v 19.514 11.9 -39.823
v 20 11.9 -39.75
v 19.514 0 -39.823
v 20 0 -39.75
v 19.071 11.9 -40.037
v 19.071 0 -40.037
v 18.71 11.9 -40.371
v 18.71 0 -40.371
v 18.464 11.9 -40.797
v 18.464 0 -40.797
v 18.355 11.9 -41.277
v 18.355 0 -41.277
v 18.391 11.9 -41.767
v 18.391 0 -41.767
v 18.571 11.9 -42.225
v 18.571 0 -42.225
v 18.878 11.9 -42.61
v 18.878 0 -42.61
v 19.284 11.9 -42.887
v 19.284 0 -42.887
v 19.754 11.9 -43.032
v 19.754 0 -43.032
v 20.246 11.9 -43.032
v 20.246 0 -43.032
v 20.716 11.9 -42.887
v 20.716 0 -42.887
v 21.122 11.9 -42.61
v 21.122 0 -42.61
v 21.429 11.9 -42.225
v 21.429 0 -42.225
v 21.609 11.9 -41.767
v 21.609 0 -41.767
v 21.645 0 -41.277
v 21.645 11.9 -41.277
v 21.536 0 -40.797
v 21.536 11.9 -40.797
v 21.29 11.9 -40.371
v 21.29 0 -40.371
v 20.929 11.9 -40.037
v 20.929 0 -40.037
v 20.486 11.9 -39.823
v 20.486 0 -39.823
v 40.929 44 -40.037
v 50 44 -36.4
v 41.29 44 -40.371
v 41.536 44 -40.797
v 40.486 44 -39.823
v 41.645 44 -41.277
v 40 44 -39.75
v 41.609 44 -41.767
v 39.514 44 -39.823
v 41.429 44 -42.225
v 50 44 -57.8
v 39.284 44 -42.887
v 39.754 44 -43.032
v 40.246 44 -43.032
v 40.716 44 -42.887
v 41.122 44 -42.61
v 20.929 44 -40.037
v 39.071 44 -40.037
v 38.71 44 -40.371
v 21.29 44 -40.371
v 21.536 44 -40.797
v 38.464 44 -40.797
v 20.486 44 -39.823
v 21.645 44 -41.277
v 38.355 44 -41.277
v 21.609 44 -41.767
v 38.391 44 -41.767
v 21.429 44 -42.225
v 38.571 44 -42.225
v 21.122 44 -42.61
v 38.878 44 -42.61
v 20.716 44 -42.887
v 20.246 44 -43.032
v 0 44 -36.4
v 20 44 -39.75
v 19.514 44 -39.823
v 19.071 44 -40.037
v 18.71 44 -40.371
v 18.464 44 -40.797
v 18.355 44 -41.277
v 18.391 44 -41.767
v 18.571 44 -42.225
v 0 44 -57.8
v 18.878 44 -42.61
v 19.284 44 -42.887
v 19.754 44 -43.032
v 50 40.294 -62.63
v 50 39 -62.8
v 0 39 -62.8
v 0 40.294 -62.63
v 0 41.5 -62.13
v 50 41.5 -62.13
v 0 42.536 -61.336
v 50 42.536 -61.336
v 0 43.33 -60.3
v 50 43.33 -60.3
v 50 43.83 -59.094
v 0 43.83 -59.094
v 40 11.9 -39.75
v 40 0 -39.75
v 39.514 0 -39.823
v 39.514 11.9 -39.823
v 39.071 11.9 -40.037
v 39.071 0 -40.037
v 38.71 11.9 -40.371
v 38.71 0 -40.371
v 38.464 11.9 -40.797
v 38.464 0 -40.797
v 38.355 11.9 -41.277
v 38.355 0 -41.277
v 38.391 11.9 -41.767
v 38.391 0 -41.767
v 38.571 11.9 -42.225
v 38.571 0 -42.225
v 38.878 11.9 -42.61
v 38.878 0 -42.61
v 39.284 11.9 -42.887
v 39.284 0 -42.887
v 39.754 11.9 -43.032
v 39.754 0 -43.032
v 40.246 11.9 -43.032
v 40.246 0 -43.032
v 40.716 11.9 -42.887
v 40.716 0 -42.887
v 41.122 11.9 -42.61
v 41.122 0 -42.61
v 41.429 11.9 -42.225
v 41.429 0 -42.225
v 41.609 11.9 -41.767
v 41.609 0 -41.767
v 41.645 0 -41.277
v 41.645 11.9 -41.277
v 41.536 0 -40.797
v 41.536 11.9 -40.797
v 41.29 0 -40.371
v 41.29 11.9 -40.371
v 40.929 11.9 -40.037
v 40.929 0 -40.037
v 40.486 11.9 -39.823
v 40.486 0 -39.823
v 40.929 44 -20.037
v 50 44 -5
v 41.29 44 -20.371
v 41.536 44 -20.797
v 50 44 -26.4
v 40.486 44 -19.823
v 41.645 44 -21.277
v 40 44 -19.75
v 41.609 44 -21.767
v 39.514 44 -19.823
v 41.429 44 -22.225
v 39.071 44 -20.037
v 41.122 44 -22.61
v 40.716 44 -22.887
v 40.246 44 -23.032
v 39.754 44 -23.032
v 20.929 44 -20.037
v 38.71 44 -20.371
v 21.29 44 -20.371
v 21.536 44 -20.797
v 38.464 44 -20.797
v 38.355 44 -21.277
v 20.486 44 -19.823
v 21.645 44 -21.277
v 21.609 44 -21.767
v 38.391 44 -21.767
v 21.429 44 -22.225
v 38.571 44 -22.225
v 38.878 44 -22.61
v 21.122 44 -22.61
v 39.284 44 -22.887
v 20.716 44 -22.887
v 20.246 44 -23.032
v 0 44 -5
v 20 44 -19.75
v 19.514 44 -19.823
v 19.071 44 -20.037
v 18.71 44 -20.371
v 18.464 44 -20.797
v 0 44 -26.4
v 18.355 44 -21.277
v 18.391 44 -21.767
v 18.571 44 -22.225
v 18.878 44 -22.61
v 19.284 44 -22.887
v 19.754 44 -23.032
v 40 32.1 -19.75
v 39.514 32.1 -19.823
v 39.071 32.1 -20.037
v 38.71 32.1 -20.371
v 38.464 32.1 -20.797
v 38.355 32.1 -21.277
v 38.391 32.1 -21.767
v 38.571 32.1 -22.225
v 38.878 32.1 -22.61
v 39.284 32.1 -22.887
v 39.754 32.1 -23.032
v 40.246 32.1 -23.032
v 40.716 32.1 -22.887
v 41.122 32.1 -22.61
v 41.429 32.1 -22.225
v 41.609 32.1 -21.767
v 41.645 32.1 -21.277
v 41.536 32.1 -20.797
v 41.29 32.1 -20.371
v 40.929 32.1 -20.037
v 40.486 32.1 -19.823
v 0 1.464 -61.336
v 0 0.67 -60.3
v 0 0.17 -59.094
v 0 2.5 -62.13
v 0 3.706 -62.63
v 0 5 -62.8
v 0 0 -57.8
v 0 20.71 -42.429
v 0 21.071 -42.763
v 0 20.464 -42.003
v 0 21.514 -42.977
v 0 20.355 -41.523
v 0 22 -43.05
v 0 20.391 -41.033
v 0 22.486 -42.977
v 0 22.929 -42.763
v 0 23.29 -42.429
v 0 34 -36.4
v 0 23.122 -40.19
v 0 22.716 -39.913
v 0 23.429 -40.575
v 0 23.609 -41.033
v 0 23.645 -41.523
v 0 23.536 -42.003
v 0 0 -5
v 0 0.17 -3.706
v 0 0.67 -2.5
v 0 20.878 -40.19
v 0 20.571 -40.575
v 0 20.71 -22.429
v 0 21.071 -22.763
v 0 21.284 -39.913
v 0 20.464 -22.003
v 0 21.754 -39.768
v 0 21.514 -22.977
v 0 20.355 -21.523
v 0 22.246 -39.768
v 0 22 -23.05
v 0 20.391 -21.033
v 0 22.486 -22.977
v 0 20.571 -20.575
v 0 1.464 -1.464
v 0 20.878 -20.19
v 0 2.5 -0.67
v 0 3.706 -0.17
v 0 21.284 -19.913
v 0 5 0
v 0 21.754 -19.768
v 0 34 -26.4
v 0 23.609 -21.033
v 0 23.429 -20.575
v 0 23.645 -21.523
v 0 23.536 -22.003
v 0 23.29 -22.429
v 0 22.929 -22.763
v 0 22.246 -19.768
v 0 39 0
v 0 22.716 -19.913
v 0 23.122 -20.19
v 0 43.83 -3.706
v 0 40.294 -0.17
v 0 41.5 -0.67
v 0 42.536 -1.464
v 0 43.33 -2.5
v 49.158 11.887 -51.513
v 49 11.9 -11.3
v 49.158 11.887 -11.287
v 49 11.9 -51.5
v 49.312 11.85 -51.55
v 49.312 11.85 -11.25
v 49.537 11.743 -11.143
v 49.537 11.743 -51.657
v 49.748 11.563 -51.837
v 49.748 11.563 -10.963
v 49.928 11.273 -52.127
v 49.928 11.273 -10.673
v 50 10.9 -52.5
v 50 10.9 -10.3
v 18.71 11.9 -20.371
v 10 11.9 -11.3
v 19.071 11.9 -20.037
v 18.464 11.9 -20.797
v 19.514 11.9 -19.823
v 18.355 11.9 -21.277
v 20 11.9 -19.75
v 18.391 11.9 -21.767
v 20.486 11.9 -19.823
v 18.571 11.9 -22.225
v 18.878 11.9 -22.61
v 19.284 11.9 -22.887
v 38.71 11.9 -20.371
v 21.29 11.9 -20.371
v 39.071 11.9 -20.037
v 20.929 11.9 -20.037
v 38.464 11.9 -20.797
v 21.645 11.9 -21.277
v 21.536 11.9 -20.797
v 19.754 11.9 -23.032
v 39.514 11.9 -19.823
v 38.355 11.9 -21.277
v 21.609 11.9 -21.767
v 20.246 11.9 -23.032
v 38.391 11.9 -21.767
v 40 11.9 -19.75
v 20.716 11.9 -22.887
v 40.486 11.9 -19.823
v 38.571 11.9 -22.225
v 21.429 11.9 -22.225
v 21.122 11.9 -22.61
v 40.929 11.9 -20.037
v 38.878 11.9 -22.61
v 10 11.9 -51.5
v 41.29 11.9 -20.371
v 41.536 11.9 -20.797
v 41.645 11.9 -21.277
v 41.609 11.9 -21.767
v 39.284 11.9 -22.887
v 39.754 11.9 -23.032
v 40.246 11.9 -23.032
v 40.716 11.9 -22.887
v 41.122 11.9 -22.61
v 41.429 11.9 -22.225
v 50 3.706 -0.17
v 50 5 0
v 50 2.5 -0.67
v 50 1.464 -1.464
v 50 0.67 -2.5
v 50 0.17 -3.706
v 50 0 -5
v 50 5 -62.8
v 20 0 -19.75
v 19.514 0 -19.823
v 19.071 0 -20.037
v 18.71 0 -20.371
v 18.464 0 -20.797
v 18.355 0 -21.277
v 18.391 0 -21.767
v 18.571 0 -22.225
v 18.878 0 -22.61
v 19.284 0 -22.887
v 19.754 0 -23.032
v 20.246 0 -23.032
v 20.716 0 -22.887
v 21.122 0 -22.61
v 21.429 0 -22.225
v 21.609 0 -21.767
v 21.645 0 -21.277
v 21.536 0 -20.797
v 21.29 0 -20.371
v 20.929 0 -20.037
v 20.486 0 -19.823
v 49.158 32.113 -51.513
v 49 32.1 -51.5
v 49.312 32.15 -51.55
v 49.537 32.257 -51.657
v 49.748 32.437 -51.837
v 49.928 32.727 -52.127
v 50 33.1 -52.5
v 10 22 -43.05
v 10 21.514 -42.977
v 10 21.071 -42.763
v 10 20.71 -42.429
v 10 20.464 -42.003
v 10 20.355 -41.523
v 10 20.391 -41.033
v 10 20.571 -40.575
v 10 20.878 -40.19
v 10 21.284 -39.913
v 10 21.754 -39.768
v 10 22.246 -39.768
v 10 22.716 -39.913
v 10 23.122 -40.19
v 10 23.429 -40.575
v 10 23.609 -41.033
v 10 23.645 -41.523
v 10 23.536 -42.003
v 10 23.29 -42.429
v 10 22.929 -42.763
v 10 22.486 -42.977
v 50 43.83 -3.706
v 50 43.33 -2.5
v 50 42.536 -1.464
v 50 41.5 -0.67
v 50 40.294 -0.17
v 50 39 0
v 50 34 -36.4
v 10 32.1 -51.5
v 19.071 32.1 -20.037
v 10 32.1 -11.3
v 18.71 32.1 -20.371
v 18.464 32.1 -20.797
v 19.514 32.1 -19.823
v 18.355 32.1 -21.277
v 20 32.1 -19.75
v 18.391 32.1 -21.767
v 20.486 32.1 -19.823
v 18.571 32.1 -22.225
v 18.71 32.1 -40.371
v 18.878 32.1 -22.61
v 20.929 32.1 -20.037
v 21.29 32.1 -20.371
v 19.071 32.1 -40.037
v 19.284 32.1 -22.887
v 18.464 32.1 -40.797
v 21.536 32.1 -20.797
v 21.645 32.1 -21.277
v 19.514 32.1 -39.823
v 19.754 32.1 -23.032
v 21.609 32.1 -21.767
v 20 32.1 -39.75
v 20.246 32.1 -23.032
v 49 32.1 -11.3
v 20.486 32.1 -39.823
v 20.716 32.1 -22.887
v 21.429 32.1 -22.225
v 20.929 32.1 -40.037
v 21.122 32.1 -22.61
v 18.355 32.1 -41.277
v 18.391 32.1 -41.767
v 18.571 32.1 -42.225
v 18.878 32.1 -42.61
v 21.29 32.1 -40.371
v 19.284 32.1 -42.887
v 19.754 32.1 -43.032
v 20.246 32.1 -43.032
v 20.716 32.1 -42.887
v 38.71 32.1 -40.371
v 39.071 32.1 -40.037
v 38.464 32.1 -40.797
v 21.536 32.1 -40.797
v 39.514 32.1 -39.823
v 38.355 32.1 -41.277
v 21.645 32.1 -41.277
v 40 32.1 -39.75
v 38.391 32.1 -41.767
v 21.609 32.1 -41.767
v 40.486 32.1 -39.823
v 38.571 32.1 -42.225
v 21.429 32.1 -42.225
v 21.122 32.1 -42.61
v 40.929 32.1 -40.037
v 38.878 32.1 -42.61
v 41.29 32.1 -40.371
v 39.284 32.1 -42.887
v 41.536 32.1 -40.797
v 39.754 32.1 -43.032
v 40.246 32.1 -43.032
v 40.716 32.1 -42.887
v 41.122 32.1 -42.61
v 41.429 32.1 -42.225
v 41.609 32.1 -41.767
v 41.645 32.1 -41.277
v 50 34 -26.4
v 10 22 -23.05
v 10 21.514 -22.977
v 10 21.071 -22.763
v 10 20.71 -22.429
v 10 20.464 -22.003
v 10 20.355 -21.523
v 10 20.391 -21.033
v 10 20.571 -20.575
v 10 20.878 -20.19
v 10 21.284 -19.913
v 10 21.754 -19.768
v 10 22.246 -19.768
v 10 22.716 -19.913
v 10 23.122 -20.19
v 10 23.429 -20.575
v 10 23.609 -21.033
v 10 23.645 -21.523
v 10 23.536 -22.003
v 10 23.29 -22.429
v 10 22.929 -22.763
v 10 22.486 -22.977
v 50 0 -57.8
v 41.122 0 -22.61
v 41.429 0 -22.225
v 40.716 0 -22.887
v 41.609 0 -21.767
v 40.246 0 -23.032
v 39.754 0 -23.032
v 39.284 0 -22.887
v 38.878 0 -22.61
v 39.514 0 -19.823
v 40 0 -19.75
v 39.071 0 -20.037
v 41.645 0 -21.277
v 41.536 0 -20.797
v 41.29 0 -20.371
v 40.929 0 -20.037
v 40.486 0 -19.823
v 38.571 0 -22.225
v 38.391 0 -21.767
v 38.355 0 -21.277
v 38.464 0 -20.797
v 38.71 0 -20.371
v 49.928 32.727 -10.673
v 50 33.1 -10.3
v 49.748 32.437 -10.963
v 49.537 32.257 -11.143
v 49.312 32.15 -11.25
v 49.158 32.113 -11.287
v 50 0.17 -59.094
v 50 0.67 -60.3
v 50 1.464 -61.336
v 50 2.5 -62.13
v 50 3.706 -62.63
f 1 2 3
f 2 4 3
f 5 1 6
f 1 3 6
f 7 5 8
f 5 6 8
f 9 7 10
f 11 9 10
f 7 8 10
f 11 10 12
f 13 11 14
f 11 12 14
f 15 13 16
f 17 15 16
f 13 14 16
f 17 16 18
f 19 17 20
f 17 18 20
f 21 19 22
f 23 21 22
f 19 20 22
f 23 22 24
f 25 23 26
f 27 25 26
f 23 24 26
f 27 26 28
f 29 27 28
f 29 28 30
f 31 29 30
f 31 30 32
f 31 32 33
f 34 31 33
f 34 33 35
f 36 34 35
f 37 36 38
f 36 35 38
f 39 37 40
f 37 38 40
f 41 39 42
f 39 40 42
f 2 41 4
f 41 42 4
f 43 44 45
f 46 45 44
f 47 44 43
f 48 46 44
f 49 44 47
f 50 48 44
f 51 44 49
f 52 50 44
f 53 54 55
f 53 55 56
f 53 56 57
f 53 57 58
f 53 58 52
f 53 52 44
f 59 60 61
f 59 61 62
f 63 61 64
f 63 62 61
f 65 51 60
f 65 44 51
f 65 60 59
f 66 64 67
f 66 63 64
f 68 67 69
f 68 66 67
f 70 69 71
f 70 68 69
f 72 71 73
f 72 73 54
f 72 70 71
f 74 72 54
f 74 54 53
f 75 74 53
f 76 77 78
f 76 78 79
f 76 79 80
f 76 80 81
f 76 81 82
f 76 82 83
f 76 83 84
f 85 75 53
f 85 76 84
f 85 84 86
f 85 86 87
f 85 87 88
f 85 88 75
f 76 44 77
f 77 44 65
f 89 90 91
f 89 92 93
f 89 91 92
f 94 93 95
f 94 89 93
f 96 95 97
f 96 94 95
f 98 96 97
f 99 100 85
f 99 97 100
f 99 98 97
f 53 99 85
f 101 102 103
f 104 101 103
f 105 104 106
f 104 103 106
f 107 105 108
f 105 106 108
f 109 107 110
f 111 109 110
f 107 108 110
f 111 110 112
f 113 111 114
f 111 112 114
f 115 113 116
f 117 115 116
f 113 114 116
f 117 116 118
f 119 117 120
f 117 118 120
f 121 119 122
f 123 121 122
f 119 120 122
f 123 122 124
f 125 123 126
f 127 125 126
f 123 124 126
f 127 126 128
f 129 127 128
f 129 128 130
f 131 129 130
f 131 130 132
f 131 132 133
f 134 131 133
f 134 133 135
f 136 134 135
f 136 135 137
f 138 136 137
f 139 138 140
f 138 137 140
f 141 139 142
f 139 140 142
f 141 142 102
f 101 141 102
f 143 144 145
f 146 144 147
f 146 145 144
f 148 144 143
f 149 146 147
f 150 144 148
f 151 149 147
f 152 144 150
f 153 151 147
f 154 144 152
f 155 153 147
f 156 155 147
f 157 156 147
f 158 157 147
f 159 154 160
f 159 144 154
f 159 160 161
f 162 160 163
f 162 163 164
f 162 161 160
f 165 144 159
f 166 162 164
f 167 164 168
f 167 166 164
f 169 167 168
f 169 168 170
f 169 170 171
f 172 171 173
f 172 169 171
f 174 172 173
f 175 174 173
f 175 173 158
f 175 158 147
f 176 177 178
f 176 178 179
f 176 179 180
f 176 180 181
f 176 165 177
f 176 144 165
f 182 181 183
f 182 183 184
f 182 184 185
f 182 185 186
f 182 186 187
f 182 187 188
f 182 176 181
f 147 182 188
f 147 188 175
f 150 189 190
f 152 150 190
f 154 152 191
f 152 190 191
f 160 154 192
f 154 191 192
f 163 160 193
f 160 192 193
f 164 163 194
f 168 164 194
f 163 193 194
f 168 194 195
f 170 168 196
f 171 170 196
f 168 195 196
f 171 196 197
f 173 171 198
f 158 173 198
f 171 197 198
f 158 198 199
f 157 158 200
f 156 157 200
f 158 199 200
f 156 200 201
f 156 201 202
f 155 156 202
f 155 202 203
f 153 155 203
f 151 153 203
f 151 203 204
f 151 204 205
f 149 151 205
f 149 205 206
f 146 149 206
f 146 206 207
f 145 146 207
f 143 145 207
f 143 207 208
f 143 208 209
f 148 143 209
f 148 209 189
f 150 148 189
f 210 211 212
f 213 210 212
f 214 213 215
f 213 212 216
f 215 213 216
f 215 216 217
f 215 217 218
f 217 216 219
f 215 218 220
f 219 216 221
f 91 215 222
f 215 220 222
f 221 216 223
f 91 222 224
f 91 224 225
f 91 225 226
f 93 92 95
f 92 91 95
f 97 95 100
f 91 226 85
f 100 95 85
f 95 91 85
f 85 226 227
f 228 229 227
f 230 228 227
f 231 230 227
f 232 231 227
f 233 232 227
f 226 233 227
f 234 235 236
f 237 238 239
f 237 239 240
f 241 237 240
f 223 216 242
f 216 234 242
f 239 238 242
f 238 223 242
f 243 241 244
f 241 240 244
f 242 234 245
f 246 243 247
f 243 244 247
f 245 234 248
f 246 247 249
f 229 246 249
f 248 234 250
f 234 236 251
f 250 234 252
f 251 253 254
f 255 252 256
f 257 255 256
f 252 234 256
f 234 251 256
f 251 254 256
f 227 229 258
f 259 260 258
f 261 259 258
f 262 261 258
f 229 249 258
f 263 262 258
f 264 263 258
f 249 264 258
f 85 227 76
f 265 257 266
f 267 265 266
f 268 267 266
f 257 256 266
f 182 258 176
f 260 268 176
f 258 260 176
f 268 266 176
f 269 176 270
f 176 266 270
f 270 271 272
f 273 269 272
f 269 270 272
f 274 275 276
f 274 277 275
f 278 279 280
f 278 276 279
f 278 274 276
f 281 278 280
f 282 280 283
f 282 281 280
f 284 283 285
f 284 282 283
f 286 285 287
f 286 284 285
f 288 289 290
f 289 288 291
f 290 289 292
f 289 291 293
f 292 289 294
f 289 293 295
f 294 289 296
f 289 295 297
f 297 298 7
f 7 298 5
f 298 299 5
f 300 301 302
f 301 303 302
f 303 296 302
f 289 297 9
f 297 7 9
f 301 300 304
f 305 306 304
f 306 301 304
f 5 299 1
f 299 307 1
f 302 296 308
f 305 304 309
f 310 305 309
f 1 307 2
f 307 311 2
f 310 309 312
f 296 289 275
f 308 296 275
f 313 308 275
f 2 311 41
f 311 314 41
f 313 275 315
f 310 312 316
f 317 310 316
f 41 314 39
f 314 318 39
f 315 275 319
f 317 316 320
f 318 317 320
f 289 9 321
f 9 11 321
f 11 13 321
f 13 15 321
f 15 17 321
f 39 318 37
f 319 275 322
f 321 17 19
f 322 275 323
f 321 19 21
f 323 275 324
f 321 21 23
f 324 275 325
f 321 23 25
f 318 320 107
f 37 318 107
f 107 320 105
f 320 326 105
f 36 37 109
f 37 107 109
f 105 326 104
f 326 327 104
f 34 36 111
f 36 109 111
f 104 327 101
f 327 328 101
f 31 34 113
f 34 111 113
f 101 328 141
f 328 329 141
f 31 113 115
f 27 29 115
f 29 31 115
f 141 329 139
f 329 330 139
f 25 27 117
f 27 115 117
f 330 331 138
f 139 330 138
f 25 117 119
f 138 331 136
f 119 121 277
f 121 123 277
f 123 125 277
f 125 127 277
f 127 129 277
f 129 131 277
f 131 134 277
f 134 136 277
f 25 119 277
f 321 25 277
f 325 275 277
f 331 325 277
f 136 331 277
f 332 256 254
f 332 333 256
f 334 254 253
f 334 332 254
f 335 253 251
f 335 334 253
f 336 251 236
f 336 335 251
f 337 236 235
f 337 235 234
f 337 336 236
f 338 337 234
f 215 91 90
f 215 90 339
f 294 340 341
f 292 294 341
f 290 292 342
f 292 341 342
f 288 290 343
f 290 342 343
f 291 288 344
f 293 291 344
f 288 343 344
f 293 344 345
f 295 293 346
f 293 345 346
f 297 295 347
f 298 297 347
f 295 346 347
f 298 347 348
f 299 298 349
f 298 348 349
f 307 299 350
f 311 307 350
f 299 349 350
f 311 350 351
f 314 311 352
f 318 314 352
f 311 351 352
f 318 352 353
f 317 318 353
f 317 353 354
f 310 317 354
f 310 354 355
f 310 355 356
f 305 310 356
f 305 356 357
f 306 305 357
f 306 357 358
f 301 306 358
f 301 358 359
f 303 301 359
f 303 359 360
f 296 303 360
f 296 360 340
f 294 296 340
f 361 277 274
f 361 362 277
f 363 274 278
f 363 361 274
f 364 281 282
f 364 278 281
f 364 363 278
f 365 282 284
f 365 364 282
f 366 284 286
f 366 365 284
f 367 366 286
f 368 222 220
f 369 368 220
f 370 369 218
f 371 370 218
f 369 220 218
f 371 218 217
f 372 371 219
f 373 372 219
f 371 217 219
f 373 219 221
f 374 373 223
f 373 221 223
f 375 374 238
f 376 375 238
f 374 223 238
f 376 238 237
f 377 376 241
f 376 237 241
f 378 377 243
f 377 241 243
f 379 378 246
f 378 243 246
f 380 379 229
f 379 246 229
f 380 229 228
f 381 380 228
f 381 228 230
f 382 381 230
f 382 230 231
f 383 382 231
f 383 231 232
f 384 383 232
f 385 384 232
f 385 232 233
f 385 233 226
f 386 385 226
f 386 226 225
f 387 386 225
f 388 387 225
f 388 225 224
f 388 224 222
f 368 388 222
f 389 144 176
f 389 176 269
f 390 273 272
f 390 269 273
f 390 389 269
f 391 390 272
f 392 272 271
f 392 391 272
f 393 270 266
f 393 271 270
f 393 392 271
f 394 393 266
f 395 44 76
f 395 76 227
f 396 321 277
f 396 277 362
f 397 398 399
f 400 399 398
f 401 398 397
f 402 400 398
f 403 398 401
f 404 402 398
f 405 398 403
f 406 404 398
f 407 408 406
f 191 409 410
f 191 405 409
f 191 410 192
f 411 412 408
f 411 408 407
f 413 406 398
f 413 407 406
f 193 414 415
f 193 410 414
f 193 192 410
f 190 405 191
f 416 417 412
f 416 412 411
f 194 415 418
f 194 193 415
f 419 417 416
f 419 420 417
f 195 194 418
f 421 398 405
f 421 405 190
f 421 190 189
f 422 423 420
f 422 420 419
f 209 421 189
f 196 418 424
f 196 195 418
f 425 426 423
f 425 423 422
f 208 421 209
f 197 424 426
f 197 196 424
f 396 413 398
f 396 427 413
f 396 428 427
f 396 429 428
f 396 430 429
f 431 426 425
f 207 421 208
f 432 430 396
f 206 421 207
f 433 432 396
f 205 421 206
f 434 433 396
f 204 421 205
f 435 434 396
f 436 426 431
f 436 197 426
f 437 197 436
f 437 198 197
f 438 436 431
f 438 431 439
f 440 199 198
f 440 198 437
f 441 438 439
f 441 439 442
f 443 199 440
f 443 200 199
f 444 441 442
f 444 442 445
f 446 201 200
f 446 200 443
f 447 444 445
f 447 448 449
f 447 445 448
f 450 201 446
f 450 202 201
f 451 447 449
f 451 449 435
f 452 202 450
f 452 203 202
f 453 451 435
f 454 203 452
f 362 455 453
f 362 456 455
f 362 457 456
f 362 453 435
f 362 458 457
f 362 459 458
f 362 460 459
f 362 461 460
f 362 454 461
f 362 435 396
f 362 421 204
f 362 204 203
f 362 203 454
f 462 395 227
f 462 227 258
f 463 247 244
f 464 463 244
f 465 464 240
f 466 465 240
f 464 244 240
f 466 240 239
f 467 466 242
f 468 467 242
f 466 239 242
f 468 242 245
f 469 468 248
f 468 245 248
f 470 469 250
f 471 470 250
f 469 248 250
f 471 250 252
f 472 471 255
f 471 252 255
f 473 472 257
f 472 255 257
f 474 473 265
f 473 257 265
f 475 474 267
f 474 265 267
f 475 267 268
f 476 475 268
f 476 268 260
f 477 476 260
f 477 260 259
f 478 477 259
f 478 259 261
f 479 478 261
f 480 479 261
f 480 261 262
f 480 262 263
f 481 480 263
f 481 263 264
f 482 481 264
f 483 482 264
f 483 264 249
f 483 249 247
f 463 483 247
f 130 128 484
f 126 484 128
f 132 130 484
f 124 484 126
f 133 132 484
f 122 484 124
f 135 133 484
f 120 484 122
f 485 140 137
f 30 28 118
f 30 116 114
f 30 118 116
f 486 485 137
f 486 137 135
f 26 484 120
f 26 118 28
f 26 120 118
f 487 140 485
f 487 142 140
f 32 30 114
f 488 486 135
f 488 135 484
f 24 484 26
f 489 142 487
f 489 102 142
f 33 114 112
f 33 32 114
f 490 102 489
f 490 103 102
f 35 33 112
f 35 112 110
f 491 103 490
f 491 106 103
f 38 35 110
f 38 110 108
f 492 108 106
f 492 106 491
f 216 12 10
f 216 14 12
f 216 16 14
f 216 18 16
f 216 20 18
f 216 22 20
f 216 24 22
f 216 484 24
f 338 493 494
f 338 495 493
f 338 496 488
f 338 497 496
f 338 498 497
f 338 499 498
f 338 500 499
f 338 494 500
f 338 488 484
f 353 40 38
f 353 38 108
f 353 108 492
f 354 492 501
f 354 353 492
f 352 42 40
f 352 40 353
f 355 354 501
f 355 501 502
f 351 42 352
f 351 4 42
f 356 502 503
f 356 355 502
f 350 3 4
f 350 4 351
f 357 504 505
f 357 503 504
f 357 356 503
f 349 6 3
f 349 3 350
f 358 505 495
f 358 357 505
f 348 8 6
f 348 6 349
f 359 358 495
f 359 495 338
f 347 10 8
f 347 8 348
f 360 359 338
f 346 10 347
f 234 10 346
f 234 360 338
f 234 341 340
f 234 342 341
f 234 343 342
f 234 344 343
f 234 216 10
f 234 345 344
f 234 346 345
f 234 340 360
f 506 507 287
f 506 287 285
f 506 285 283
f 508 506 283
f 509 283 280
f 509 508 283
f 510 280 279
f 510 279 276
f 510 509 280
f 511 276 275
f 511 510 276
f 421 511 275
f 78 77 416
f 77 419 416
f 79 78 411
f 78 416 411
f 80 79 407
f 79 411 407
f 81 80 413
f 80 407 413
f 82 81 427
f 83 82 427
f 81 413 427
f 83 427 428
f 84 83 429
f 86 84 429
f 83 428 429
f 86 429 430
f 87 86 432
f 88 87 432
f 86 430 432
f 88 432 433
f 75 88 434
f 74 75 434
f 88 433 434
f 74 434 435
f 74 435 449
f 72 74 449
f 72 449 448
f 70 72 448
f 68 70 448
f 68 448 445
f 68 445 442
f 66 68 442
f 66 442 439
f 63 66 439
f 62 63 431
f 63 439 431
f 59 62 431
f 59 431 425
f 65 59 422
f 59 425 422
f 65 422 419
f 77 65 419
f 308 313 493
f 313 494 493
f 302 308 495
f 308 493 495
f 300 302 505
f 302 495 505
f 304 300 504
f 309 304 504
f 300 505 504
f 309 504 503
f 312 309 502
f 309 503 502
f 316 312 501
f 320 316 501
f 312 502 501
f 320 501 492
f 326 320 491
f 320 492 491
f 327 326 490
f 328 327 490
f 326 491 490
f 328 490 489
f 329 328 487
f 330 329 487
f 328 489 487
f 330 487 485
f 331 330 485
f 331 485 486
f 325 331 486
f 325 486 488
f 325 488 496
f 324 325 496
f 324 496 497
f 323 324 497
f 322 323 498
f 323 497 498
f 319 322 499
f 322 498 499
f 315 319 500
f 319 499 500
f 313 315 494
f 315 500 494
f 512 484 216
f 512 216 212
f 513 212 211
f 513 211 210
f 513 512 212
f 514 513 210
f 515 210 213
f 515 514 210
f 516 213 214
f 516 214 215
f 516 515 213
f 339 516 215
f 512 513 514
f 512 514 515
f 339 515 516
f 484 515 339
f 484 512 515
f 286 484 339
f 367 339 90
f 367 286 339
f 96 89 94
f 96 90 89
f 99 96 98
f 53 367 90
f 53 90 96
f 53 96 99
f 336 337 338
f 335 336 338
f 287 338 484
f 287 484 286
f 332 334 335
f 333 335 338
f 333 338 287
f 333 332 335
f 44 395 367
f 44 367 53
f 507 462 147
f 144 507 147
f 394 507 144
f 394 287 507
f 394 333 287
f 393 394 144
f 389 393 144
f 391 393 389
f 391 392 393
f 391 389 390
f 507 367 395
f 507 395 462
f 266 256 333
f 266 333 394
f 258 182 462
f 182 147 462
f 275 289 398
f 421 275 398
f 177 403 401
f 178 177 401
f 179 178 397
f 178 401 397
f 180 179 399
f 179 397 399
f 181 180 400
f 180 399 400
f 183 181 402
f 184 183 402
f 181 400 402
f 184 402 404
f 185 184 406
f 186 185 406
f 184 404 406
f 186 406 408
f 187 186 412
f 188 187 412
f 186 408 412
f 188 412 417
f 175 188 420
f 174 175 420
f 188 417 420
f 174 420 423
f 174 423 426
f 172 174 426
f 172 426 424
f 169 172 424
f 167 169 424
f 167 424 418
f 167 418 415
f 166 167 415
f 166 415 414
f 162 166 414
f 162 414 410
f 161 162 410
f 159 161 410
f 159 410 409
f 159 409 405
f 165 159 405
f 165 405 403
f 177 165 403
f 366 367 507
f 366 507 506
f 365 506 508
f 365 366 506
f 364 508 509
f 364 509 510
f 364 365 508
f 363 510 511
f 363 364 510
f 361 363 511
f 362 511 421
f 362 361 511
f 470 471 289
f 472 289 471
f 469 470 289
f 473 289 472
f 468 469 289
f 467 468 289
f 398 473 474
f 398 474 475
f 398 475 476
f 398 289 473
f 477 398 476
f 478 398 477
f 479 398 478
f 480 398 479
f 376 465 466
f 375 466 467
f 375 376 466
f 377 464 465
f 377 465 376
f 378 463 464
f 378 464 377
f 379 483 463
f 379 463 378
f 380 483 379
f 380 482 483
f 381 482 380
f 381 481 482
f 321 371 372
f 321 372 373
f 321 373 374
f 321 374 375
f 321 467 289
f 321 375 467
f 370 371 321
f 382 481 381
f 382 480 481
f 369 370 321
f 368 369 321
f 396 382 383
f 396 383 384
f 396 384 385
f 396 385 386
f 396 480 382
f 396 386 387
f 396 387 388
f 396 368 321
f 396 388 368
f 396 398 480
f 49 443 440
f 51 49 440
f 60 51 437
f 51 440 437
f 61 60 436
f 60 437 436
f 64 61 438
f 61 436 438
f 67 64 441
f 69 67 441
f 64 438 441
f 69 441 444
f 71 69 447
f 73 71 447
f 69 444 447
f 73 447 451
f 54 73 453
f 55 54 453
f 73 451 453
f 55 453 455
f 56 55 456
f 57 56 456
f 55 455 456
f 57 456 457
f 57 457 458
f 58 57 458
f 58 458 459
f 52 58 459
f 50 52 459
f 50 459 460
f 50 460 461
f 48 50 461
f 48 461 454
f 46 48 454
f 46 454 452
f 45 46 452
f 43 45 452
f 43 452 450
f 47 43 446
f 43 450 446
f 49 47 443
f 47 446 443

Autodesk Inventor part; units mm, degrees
ref_plane "YZ Plane" through (0, 0, 0) normal (1, 0, 0) x (0, 1, 0)
ref_plane "XZ Plane" through (0, 0, 0) normal (0, 1, 0) x (-1, 0, 0)
ref_plane "XY Plane" through (0, 0, 0) normal (0, 0, 1) x (1, 0, 0)
sketch "スケッチ1" plane through (0, 0, 0) normal (1, 0, 0) x (0, 1, 0)
  line L0 (0, 0) -> (44, 0)
  line L1 (44, 0) -> (44, -62.8)
  line L2 (44, -62.8) -> (0, -62.8)
  line L3 (0, -62.8) -> (0, 0)
  dimension "d0" = 44
  dimension "d1" = 62.8
extrude "押し出し1" add sketch "スケッチ1" along normal blind 50
sketch "スケッチ2" plane through (50, 0, 0) normal (1, 0, 0) x (0, 0, -1)
  line L0 (0, 44) -> (0, 0) projected
  line L1 (0, 22) -> (62.8, 22)
  line L2 (62.8, 0) -> (62.8, 44) projected
  line L3 (62.8, 44) -> (0, 44) projected
  line L4 (31.4, 44) -> (31.4, 0)
  line L5 (0, 0) -> (62.8, 0) projected
  line L6 (31.4, 22) -> (51.5, 22)
  line L7 (51.5, 22) -> (51.5, 32.1)
  line L8 (51.5, 32.1) -> (31.4, 32.1)
  line L9 (31.4, 32.1) -> (31.4, 22)
  line L10 (11.3, 22) -> (11.3, 32.1)
  line L11 (11.3, 32.1) -> (31.4, 32.1)
  line L12 (51.5, 22) -> (51.5, 11.9)
  line L13 (51.5, 11.9) -> (31.4, 11.9)
  line L14 (11.3, 11.9) -> (31.4, 11.9)
  line L15 (11.3, 22) -> (11.3, 11.9)
  dimension "d4" = 20.1
  dimension "d5" = 10.1
extrude "押し出し2" cut sketch "スケッチ2" against normal blind 40 contours L10 L11 L4 L1 | L1 L4 L14 L15 | L8 L7 L1 L4 | L1 L12 L13 L4
sketch "スケッチ3" plane through (0, 44, 0) normal (0, 1, 0) x (1, 0, 0)
  line L0 (0, 0) -> (50, 0) projected
  line L1 (10, 0) -> (10, 62.8)
  line L2 (0, 62.8) -> (50, 62.8) projected
  line L3 (0, 62.8) -> (0, 0) projected
  line L4 (0, 31.4) -> (50, 31.4)
  line L5 (50, 0) -> (50, 62.8) projected
  line L6 (10, 41.4) -> (50, 41.4)
  point P0 (20, 41.4)
  point P1 (40, 41.4)
  point P2 (20, 21.4)
  point P3 (40, 21.4)
  dimension "d8" = 10
  dimension "d9" = 10
  dimension "d10" = 10
  dimension "d11" = 20
hole "穴1" at (20, 44, -41.4) at (40, 44, -41.4) at (20, 44, -21.4) at (40, 44, -21.4) direction (0, -1, 0) diameter 3.3 end through all
fillet "フィレット1" radius 5 4 edges at (25, 44, 0) (25, 0, 0) (25, 0, -62.8) (25, 44, -62.8)
sketch "スケッチ4" plane through (10, 0, 0) normal (1, 0, 0) x (0, 0, -1)
  line L0 (11.3, 11.9) -> (11.3, 32.1) projected
  line L1 (11.3, 22) -> (51.5, 22)
  line L2 (51.5, 32.1) -> (51.5, 11.9) projected
  line L3 (11.3, 32.1) -> (51.5, 32.1) projected
  line L4 (31.4, 32.1) -> (31.4, 11.9)
  line L5 (51.5, 11.9) -> (11.3, 11.9) projected
  point P0 (0, 0)
  point P1 (41.4, 22)
  point P2 (21.4, 22)
  dimension "d20" = 10
hole "穴2" at (10, 22, -41.4) at (10, 22, -21.4) direction (-1, 0, 0) diameter 3.3 end through all
fillet "フィレット2" radius 1 4 edges at (50, 22, -51.5) (50, 11.9, -31.4) (50, 32.1, -31.4) (50, 22, -11.3)
sketch "スケッチ5" plane through (50, 0, 0) normal (1, 0, 0) x (0, 0, -1)
  line L0 (57.8, 44) -> (5, 44) projected
  line L1 (31.4, 44) -> (31.4, 33.1)
  line L2 (52.5, 33.1) -> (10.3, 33.1) projected
  line L3 (31.4, 44) -> (36.4, 44)
  line L4 (36.4, 44) -> (36.4, 34)
  line L5 (36.4, 34) -> (31.4, 34)
  line L6 (31.4, 34) -> (31.4, 44)
  line L7 (26.4, 44) -> (26.4, 34)
  line L8 (26.4, 34) -> (31.4, 34)
  point P0 (0, 0)
  point P1 (26.4, 44)
  dimension "d29" = 10
  dimension "d30" = 5
extrude "押し出し3" cut sketch "スケッチ5" against normal blind 100
properties part number "framefixpart1_forearm"
